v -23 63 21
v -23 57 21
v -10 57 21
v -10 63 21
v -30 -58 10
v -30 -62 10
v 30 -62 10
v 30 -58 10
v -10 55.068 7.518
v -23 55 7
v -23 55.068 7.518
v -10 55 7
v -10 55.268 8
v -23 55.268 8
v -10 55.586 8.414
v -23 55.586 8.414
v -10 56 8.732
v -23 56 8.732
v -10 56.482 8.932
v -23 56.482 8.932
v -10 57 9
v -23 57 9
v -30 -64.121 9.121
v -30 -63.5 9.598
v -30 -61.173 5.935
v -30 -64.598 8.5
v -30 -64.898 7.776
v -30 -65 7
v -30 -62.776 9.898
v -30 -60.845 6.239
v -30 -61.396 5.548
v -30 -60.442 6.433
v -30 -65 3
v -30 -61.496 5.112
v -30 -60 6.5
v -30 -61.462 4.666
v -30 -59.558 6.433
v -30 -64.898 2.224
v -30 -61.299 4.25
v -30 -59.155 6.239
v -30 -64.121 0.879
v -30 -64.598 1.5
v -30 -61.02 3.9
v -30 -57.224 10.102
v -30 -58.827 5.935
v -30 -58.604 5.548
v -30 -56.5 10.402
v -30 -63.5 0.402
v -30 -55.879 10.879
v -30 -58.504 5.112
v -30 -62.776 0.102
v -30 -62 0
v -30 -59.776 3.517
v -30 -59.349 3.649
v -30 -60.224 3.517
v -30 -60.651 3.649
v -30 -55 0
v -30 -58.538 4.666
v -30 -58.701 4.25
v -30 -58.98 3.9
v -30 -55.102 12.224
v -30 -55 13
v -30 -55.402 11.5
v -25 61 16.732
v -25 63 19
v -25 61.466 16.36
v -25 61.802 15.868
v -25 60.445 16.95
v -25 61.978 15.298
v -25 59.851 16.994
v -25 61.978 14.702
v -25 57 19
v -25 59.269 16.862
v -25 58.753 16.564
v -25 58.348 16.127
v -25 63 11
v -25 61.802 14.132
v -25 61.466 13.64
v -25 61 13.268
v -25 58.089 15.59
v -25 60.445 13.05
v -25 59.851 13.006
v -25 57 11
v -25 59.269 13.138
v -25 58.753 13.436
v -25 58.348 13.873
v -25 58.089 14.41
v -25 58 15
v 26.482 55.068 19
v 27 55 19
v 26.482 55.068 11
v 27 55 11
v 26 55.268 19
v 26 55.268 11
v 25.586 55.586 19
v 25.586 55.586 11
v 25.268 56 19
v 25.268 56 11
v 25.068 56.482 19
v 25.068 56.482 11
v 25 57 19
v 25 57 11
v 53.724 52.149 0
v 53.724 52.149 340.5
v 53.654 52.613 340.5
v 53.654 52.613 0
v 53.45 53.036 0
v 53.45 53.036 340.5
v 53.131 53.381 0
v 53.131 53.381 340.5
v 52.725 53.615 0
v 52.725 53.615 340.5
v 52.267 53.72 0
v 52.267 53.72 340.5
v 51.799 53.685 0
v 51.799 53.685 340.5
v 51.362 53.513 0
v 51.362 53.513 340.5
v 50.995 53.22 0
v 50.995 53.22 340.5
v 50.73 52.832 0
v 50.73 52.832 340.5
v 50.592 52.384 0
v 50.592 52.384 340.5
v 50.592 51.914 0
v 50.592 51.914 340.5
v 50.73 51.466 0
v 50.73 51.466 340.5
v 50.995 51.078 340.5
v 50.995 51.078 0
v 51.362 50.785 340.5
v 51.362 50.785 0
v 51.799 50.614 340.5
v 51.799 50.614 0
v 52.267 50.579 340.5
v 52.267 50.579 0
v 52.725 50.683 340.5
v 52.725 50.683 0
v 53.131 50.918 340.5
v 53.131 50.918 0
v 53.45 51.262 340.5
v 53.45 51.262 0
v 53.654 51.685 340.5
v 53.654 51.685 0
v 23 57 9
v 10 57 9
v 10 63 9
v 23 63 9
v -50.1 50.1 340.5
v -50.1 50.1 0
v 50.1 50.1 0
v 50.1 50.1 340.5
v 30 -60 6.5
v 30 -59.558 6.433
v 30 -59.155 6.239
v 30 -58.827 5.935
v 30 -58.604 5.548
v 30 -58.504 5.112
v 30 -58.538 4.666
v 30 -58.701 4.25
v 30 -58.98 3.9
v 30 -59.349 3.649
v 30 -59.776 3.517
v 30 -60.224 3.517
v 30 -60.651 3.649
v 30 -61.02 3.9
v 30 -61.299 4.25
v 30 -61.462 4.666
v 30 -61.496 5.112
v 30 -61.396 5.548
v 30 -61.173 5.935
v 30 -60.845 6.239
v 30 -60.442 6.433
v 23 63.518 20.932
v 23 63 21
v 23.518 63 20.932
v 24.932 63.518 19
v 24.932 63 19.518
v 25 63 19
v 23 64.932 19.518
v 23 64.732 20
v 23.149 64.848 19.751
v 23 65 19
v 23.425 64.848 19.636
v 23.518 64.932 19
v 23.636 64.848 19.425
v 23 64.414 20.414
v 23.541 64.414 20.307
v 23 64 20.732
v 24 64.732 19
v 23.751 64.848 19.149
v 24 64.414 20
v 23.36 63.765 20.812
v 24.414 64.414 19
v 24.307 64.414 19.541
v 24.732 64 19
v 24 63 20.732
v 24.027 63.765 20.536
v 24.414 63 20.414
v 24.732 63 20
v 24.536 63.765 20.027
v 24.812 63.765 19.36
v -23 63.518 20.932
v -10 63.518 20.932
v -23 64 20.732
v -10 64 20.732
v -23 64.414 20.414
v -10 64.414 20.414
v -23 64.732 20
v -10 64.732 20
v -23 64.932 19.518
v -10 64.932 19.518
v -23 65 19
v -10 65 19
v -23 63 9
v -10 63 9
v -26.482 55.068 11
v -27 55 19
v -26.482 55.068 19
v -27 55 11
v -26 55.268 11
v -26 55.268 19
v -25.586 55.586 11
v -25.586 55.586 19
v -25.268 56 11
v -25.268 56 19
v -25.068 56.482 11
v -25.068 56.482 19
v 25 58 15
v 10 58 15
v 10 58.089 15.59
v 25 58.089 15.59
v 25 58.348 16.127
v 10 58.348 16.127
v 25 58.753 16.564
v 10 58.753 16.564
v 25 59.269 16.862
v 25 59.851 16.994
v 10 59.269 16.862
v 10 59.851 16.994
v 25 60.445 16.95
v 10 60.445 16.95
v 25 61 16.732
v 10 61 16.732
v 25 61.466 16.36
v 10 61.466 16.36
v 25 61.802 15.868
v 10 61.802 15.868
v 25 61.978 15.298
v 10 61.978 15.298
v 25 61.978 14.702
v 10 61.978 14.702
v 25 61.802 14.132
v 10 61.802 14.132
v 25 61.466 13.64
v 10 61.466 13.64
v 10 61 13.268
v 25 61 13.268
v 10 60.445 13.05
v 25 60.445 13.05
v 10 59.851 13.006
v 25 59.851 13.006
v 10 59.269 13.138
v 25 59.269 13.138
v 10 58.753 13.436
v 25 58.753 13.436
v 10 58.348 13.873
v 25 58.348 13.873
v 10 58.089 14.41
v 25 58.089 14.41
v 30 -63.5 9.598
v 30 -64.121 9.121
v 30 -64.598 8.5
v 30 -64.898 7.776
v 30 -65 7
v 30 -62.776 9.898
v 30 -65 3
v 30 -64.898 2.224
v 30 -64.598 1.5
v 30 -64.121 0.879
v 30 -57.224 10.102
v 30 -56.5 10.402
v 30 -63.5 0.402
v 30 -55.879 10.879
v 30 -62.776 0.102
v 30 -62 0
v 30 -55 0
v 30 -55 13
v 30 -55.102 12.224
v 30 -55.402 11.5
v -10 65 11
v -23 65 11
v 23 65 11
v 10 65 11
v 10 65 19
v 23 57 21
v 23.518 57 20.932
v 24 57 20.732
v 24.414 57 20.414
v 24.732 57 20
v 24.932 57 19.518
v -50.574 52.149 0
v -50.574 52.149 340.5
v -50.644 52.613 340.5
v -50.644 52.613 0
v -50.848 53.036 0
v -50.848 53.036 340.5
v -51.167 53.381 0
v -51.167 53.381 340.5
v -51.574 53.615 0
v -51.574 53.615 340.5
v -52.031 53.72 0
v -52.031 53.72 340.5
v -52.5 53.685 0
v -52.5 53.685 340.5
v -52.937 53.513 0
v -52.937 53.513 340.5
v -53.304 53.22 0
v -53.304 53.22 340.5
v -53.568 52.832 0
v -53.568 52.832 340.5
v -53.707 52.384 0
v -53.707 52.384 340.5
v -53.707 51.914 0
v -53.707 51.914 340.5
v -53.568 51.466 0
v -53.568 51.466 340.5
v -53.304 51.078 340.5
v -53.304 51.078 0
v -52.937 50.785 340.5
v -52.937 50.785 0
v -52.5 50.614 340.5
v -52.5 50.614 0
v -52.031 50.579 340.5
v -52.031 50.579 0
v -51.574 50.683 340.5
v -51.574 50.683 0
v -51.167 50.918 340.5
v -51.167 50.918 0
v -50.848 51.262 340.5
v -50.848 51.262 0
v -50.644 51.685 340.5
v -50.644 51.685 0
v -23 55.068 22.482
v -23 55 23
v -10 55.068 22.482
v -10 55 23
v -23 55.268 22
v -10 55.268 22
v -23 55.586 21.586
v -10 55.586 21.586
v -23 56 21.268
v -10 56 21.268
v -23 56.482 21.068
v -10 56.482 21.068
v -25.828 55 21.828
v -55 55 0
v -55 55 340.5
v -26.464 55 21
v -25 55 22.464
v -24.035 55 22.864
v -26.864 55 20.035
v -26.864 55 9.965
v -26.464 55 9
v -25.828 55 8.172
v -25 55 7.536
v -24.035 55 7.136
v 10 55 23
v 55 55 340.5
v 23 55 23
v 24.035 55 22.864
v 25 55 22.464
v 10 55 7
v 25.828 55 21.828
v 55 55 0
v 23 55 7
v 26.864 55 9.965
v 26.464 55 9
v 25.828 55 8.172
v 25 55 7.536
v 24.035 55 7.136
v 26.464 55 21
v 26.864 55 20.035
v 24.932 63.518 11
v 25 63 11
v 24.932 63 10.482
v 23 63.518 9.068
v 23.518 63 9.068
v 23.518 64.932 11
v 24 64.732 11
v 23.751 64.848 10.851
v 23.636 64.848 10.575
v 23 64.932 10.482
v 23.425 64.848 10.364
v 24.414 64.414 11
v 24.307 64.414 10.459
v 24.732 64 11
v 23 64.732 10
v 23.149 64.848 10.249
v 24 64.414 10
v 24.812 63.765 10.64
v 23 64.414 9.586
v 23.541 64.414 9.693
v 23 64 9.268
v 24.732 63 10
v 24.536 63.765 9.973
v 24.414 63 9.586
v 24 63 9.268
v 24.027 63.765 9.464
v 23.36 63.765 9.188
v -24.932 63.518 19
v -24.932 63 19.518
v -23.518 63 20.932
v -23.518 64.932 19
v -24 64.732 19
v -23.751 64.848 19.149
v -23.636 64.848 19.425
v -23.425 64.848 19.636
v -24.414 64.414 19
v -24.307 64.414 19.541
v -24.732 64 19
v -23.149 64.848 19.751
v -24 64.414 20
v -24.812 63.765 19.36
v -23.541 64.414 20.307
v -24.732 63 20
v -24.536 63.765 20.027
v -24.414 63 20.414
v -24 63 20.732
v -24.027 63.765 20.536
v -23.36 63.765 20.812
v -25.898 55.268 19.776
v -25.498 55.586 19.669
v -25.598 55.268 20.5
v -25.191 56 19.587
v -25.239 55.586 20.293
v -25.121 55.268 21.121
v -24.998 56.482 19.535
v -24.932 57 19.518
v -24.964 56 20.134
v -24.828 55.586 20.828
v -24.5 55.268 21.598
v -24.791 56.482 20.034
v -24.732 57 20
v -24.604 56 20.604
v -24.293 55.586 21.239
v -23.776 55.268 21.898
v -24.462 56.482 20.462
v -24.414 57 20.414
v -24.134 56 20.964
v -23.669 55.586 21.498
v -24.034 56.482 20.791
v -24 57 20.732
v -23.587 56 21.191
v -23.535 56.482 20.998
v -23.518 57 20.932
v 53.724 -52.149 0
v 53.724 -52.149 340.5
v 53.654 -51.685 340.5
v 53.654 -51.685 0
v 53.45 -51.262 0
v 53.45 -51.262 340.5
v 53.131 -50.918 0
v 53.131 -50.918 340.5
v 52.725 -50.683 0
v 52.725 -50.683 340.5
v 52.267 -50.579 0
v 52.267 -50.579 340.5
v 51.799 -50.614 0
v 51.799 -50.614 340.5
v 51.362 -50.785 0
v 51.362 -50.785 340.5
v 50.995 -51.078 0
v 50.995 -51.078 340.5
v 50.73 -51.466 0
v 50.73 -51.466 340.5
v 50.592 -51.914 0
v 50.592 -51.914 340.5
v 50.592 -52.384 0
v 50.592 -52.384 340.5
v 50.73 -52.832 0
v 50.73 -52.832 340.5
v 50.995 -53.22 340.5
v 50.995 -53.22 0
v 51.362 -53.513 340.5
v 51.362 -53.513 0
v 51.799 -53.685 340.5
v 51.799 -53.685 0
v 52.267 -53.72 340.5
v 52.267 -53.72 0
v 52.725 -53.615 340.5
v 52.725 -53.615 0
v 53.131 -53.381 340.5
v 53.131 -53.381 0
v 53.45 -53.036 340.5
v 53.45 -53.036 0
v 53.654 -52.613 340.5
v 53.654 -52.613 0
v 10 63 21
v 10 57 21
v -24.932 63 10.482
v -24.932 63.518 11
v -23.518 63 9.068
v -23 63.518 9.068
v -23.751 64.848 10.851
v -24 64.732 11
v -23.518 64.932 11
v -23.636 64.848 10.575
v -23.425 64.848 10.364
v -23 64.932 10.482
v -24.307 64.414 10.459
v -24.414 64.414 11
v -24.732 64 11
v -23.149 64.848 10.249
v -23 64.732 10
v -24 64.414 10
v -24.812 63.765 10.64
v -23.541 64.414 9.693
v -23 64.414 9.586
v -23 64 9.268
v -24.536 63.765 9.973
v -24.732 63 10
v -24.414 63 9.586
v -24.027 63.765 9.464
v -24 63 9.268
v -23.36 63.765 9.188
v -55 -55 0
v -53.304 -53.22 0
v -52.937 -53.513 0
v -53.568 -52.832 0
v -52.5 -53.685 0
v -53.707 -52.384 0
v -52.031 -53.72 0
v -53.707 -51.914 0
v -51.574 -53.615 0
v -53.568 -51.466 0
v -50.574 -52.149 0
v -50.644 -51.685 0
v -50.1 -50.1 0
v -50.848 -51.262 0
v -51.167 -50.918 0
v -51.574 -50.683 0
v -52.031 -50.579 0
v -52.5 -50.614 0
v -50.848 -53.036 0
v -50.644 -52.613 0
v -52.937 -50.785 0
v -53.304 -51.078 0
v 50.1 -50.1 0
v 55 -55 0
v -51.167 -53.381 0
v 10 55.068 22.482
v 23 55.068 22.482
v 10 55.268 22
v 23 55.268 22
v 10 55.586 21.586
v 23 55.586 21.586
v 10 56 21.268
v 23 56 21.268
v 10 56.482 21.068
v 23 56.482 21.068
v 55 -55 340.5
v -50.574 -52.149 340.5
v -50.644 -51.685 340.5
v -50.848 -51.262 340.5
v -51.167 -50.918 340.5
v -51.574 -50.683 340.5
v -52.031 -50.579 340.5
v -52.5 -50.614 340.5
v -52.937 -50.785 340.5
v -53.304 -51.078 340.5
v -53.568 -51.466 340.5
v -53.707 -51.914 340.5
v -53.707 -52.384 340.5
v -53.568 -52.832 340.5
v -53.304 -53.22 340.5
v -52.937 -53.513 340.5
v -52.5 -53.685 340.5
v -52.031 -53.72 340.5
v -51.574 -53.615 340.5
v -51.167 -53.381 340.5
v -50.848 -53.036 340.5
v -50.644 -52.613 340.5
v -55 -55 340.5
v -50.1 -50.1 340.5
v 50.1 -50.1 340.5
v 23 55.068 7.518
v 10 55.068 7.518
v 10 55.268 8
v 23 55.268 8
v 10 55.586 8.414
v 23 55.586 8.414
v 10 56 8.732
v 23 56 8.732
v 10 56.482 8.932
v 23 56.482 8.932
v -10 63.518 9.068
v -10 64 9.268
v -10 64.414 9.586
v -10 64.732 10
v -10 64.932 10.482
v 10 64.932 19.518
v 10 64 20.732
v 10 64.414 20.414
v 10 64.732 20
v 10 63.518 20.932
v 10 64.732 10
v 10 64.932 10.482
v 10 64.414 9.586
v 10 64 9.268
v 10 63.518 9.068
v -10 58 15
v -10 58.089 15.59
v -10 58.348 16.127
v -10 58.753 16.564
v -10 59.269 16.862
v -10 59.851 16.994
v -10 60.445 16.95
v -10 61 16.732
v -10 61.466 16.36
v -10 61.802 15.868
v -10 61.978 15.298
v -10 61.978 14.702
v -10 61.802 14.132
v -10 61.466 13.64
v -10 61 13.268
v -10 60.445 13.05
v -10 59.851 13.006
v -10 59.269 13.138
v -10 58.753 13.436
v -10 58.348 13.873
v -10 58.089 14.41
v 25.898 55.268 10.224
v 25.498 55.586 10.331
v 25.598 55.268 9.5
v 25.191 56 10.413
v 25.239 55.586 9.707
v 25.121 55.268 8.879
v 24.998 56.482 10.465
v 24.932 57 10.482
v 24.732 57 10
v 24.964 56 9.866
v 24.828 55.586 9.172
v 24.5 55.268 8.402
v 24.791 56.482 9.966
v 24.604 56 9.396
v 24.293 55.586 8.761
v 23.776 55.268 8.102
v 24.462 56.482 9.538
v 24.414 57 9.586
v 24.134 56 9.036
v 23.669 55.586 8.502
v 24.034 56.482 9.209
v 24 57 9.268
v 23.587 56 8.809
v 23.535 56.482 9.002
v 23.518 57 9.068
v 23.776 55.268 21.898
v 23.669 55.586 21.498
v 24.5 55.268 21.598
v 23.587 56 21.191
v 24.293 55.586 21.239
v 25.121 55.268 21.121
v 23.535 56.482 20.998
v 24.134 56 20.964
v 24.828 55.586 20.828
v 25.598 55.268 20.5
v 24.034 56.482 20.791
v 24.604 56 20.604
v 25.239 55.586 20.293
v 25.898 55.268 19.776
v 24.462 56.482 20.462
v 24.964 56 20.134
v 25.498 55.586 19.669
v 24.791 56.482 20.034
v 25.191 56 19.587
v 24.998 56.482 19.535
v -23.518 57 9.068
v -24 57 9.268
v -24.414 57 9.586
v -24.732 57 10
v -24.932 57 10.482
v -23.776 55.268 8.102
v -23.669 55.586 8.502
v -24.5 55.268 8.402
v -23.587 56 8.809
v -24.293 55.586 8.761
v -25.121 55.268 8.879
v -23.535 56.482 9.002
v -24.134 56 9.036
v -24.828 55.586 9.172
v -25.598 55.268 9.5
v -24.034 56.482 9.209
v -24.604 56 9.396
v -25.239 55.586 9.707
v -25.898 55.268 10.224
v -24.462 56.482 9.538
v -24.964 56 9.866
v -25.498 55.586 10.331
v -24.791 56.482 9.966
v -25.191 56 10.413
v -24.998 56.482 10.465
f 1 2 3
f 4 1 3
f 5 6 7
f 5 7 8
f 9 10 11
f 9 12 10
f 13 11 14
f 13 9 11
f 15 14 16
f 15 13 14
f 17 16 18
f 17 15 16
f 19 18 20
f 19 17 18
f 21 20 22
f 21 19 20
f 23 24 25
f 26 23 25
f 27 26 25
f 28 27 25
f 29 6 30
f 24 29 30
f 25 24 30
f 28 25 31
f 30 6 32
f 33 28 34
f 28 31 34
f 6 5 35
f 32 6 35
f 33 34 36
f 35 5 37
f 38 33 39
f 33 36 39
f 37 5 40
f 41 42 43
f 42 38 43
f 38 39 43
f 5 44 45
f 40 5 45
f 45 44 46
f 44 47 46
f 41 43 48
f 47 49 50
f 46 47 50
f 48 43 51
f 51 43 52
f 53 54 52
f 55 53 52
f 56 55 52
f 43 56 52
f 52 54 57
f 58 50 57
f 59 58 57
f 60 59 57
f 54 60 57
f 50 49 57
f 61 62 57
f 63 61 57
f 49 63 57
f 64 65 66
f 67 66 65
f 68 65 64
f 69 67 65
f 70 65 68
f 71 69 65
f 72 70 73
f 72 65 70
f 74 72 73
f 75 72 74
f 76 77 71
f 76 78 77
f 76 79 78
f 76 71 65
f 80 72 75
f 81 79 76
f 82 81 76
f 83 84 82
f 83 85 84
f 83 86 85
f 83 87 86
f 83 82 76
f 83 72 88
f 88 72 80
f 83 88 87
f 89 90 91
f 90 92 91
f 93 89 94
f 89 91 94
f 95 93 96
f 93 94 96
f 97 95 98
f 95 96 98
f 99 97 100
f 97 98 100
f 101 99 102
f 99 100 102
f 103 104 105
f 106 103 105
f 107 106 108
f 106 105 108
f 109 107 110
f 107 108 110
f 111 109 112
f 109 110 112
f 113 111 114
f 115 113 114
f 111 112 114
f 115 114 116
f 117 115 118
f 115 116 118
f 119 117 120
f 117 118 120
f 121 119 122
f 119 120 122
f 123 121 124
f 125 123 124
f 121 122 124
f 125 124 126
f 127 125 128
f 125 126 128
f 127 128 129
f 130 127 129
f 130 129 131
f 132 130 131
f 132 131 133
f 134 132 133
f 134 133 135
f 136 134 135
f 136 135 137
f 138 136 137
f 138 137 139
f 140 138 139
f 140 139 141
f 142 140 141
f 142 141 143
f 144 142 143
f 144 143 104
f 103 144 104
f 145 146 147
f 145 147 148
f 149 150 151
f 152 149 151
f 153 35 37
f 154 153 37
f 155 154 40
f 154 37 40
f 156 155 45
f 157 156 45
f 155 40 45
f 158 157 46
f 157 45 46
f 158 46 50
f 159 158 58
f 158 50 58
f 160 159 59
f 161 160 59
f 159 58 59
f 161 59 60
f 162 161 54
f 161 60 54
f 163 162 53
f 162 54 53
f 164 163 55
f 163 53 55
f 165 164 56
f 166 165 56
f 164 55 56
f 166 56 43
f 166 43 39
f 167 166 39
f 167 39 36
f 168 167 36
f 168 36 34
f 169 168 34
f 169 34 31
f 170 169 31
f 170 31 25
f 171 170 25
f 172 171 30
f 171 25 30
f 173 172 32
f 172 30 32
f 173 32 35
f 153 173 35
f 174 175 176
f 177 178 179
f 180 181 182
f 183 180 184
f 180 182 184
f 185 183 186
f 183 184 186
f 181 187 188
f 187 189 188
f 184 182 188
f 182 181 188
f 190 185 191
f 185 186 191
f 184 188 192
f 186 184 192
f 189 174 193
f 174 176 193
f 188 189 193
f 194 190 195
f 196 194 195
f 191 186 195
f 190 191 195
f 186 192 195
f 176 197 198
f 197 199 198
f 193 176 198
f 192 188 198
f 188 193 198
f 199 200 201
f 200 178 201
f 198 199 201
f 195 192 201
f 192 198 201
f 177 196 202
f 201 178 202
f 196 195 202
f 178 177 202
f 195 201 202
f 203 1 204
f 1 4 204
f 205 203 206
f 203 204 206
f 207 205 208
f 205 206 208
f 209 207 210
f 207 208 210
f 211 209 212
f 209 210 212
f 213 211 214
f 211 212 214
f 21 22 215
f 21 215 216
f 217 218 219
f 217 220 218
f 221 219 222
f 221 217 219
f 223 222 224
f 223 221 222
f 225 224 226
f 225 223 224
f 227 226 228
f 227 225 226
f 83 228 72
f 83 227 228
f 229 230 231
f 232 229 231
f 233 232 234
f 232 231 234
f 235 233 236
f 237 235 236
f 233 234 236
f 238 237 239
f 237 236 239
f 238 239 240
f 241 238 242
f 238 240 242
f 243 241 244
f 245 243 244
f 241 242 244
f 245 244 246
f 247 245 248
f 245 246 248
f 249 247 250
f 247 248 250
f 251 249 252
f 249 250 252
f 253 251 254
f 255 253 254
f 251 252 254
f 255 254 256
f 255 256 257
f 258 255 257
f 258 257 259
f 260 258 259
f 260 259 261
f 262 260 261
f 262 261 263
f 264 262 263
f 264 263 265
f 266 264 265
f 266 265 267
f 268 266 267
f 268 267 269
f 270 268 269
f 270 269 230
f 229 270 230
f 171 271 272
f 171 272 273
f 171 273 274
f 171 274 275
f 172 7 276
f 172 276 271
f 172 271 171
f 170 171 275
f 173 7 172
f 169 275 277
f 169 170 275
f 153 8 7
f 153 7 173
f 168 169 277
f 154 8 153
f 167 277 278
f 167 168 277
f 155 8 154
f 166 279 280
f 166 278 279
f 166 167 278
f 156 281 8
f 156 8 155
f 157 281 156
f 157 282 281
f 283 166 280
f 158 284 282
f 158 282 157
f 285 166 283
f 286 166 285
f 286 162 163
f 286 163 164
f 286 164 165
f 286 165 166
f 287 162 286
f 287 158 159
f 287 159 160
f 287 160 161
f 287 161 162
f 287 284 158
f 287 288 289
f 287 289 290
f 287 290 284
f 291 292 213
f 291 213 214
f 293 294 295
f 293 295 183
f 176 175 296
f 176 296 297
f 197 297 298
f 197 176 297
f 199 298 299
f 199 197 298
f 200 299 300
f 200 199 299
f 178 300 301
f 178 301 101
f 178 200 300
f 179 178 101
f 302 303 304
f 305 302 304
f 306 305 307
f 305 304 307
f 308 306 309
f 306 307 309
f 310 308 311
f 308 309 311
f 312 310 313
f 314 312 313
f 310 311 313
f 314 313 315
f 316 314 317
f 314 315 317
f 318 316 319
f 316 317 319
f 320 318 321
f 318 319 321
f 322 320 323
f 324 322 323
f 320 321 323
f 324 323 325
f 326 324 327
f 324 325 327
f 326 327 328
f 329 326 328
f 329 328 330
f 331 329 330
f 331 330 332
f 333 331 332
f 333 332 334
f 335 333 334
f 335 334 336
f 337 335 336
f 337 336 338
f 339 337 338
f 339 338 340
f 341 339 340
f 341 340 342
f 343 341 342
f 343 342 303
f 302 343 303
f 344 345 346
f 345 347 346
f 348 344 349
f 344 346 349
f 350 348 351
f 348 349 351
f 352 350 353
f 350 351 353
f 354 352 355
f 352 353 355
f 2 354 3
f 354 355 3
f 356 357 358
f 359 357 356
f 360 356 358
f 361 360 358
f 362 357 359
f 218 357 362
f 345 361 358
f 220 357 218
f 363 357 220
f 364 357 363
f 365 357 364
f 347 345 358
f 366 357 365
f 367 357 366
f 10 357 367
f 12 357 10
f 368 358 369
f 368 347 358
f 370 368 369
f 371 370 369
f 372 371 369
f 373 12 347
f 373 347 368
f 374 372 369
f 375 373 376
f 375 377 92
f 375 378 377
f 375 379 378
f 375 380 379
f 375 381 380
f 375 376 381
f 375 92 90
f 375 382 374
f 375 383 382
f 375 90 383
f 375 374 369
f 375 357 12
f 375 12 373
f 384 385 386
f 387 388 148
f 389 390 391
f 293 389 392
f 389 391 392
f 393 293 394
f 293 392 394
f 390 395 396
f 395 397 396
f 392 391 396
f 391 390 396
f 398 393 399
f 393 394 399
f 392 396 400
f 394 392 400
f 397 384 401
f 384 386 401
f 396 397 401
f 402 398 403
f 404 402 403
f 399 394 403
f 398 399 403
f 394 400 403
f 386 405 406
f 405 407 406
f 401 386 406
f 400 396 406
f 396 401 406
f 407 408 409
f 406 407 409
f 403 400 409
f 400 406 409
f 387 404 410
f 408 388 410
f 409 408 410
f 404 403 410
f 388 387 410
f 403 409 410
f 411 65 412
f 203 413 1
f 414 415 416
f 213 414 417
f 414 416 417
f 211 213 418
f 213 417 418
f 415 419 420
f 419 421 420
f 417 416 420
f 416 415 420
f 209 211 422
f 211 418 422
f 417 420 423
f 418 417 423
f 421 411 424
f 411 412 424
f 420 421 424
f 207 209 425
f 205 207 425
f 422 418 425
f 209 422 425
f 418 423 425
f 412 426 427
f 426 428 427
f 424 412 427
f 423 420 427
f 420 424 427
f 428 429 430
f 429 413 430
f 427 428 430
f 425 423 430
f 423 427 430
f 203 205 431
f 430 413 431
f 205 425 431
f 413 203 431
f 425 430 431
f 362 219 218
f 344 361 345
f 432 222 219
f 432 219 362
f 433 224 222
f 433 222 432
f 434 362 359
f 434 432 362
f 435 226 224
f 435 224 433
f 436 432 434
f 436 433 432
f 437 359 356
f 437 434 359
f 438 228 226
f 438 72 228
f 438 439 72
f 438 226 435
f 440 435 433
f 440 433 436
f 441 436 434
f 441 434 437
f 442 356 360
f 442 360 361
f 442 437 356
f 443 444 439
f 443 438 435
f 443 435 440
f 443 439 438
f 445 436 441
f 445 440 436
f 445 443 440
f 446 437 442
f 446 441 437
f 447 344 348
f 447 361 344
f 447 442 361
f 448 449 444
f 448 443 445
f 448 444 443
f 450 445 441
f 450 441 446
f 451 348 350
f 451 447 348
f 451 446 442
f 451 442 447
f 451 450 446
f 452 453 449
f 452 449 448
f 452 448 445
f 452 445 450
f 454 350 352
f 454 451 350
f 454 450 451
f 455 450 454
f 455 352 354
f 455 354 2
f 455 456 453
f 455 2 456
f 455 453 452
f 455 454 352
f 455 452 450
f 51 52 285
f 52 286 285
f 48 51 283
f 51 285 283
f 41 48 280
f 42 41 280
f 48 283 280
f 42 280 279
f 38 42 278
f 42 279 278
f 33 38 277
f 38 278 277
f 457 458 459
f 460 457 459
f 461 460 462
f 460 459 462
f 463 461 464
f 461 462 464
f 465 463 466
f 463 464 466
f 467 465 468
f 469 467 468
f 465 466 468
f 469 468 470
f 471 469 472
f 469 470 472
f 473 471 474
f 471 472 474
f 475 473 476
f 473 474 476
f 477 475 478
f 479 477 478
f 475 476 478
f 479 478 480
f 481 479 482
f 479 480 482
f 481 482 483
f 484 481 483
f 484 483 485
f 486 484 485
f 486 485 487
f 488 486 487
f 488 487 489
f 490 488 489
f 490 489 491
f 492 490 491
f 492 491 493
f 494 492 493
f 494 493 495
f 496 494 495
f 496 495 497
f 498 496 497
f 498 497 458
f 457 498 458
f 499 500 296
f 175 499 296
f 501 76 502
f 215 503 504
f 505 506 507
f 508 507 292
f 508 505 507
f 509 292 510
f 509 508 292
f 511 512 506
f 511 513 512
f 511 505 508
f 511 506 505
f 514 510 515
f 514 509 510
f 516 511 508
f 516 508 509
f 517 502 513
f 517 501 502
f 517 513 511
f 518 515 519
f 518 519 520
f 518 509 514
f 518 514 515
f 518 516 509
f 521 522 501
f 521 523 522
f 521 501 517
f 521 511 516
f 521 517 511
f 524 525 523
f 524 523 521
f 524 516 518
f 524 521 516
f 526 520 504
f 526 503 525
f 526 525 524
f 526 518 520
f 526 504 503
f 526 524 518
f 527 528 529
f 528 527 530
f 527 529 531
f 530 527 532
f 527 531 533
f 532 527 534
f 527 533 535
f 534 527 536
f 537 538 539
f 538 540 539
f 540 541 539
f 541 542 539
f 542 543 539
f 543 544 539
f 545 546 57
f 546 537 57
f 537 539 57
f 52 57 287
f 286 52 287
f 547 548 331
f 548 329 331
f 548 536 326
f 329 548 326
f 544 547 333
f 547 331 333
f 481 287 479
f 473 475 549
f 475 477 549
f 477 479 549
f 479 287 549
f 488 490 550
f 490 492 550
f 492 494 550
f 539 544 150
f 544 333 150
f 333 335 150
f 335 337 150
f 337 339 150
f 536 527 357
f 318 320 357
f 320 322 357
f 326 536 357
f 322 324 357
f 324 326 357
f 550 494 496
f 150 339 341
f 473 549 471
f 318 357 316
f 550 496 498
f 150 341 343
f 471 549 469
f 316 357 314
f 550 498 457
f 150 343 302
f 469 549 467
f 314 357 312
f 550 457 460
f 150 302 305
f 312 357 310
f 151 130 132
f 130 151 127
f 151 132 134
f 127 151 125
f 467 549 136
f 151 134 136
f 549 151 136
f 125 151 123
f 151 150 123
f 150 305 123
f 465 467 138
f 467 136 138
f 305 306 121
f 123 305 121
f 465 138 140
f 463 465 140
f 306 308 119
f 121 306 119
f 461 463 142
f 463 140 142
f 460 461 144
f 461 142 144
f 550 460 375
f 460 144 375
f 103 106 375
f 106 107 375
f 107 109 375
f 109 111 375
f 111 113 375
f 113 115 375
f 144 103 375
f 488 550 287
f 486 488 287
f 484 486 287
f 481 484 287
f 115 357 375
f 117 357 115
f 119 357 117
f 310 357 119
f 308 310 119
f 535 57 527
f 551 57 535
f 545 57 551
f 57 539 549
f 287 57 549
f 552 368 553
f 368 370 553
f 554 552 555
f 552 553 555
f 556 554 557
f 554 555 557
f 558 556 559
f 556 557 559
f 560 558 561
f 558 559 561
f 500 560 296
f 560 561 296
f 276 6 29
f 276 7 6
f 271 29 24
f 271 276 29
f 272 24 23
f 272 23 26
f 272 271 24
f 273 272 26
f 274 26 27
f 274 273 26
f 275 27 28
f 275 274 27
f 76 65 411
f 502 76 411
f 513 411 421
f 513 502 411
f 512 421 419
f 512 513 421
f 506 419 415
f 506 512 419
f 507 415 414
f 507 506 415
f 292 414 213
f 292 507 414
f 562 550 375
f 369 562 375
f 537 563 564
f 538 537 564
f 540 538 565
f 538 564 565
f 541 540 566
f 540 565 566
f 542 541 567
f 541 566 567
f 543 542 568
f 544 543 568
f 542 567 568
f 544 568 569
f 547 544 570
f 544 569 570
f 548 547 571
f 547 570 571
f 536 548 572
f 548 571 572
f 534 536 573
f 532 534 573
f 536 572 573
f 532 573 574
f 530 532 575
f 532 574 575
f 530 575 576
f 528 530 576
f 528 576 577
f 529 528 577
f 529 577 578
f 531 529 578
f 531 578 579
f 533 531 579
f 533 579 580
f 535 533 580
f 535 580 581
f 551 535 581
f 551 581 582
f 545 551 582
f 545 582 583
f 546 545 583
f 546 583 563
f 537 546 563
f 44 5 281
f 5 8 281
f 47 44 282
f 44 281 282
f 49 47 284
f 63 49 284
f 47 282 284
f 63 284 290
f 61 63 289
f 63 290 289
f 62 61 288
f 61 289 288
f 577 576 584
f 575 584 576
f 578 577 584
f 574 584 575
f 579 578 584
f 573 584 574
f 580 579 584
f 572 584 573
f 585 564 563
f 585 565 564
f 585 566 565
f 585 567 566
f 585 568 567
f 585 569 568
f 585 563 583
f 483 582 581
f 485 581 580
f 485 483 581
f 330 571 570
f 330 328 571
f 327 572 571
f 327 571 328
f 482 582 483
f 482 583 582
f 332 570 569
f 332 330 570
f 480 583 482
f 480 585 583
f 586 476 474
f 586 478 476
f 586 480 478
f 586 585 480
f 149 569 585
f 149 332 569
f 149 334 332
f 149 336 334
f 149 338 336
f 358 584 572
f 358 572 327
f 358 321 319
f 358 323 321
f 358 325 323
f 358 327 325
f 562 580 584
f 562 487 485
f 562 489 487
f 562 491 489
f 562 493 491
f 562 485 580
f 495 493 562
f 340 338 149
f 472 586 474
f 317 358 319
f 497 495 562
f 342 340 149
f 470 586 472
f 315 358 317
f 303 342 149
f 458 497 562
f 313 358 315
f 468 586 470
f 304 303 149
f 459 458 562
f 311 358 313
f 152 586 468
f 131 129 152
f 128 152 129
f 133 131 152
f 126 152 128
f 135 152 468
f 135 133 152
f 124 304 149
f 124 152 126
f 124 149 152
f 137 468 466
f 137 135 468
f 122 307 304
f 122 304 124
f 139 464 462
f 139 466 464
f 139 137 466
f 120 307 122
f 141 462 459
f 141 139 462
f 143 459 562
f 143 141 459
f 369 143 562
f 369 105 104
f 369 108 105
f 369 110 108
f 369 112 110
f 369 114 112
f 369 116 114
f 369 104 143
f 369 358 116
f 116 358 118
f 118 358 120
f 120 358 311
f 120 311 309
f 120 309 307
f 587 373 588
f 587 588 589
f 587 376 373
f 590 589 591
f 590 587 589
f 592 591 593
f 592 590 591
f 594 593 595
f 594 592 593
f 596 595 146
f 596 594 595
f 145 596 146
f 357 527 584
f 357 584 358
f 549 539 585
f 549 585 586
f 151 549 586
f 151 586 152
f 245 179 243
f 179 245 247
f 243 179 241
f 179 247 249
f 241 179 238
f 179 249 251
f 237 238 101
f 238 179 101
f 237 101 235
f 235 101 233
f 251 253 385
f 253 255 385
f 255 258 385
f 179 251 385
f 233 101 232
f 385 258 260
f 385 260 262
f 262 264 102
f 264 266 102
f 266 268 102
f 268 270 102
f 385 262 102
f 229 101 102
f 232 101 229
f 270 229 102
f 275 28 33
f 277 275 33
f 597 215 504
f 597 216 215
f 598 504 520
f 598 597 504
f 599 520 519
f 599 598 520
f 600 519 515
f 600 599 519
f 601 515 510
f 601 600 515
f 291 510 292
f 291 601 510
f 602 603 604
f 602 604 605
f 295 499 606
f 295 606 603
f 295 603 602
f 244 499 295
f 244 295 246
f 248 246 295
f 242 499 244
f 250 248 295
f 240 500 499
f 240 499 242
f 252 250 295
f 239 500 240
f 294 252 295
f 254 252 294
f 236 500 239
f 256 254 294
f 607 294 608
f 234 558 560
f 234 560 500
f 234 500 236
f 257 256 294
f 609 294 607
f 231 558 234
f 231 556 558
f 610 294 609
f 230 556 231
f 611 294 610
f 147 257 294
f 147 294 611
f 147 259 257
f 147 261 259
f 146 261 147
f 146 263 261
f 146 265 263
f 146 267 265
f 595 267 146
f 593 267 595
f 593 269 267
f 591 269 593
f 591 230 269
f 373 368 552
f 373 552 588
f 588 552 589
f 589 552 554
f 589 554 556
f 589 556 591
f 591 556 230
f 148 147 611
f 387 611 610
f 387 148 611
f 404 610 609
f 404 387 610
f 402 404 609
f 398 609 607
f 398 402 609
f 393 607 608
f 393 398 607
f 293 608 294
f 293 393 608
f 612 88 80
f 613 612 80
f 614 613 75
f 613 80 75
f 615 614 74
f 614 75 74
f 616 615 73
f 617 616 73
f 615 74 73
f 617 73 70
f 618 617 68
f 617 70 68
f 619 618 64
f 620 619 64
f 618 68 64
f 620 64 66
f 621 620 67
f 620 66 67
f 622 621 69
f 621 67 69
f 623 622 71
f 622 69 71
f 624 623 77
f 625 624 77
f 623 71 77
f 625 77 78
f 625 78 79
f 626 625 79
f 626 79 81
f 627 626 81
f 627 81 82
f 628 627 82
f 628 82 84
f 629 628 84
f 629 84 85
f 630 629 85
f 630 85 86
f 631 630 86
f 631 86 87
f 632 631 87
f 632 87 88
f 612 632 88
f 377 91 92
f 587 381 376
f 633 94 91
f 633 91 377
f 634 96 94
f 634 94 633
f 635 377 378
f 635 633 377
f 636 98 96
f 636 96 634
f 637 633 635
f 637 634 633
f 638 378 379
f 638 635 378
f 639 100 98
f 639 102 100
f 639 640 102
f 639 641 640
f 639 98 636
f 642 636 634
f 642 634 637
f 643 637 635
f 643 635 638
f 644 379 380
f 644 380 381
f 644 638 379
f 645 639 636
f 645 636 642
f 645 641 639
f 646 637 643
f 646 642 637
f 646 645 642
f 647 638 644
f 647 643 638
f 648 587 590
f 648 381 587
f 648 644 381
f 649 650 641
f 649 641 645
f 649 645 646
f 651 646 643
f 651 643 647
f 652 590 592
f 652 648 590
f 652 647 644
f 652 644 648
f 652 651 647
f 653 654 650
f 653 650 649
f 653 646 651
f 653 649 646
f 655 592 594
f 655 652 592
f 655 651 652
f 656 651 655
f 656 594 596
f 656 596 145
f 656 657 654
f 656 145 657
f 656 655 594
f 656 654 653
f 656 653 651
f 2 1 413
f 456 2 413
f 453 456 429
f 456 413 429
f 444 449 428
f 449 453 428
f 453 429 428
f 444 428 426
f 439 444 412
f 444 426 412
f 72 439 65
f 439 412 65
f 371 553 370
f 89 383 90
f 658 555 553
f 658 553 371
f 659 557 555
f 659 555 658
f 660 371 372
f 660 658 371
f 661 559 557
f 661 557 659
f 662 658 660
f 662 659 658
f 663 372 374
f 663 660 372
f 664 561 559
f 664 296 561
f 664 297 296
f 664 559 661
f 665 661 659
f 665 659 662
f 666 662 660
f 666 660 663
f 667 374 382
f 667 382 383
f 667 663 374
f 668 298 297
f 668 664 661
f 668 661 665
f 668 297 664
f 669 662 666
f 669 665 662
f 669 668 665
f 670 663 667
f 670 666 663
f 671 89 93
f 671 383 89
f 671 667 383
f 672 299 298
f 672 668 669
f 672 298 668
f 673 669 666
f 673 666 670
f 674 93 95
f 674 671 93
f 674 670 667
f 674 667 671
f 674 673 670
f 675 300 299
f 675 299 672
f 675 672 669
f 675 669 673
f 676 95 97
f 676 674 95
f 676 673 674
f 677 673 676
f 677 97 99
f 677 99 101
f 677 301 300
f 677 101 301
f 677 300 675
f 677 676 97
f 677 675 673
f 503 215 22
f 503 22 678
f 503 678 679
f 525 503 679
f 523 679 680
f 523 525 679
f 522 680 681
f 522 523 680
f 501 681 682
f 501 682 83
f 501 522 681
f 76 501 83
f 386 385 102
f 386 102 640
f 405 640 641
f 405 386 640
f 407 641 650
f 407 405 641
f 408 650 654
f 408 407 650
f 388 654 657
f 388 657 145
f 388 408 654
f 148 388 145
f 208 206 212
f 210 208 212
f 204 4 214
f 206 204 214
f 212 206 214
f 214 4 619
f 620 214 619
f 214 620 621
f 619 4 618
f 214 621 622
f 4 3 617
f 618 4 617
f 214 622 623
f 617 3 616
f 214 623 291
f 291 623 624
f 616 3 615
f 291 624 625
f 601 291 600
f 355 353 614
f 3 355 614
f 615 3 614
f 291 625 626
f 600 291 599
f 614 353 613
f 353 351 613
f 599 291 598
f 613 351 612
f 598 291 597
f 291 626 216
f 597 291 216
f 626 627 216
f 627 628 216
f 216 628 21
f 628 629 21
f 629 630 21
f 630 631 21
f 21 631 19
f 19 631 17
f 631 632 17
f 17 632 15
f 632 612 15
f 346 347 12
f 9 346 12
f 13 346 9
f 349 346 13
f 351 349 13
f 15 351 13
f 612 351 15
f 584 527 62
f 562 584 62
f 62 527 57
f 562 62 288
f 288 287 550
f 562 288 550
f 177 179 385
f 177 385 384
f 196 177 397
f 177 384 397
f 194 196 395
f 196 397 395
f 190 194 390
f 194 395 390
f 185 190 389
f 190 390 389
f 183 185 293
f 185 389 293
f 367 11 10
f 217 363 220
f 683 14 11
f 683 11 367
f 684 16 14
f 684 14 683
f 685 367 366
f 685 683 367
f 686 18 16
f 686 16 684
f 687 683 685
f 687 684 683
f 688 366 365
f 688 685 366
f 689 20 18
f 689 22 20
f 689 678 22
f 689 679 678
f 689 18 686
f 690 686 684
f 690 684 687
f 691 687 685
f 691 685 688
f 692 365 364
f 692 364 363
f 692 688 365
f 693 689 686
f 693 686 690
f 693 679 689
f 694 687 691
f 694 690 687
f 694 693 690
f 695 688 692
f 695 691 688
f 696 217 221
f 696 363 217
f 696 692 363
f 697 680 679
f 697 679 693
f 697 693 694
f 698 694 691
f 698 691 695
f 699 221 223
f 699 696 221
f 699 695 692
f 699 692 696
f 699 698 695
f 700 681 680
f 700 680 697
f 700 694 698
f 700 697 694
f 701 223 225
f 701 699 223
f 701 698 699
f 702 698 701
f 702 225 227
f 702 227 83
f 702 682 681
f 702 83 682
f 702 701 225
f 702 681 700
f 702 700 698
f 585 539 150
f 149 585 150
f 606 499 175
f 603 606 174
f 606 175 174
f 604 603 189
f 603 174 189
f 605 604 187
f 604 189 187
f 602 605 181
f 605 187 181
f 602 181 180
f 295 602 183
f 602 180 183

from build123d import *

# Parameters (mm, degrees)
SKETCH1_W                = 110
SKETCH1_H                = 110
SKETCH1_W_2              = 100.2
SKETCH1_H_2              = 100.2
BOSS_EXTRUDE1_DEPTH      = 340.5
CUT_EXTRUDE1_REACH       = 351.271
SKETCH2_R                = 1.575
BOSS_EXTRUDE3_DEPTH      = 30
BOSS_EXTRUDE3_DEPTH_BACK = 30
SKETCH3_W                = 10
SKETCH3_H                = 10
SKETCH4_R                = 1.5
CUT_EXTRUDE2_DEPTH       = 60
SKETCH6_W                = 15
SKETCH6_H                = 12
BOSS_EXTRUDE4_DEPTH      = 10
CUT_EXTRUDE3_REACH       = 357.76
SKETCH7_R                = 2
FILLET1_R                = 2
FILLET2_R                = 3


with BuildPart() as part:
    # Sketch1 → Boss-Extrude1 (new body)
    with BuildSketch(Plane.XY):
        Rectangle(SKETCH1_W, SKETCH1_H)
        Rectangle(SKETCH1_W_2, SKETCH1_H_2, mode=Mode.SUBTRACT)
    extrude(amount=BOSS_EXTRUDE1_DEPTH)

    # Sketch2 → Cut-Extrude1 (cut, up to next)
    with BuildSketch(Plane.XY.offset(340.5), mode=Mode.PRIVATE) as cut_extrude1_sk1:
        with Locations((-52.149125113, 52.149125113)):
            Circle(SKETCH2_R)
    cut_extrude1_tool1 = extrude(cut_extrude1_sk1.sketch, amount=-CUT_EXTRUDE1_REACH, mode=Mode.PRIVATE) & part.part
    # Sketch2 → Cut-Extrude1 (cut, up to next)
    with BuildSketch(Plane.XY.offset(340.5), mode=Mode.PRIVATE) as cut_extrude1_sk2:
        with Locations((52.149125113, 52.149125113)):
            Circle(SKETCH2_R)
    cut_extrude1_tool2 = extrude(cut_extrude1_sk2.sketch, amount=-CUT_EXTRUDE1_REACH, mode=Mode.PRIVATE) & part.part
    # Sketch2 → Cut-Extrude1 (cut, up to next)
    with BuildSketch(Plane.XY.offset(340.5), mode=Mode.PRIVATE) as cut_extrude1_sk3:
        with Locations((52.149125113, -52.149125113)):
            Circle(SKETCH2_R)
    cut_extrude1_tool3 = extrude(cut_extrude1_sk3.sketch, amount=-CUT_EXTRUDE1_REACH, mode=Mode.PRIVATE) & part.part
    # Sketch2 → Cut-Extrude1 (cut, up to next)
    with BuildSketch(Plane.XY.offset(340.5), mode=Mode.PRIVATE) as cut_extrude1_sk4:
        with Locations((-52.149125113, -52.149125113)):
            Circle(SKETCH2_R)
    cut_extrude1_tool4 = extrude(cut_extrude1_sk4.sketch, amount=-CUT_EXTRUDE1_REACH, mode=Mode.PRIVATE) & part.part
    add(cut_extrude1_tool1.solids().sort_by_distance((-52.149125, 52.149125, 340.5))[0], mode=Mode.SUBTRACT)
    add(cut_extrude1_tool2.solids().sort_by_distance((52.149125, 52.149125, 340.5))[0], mode=Mode.SUBTRACT)
    add(cut_extrude1_tool3.solids().sort_by_distance((52.149125, -52.149125, 340.5))[0], mode=Mode.SUBTRACT)
    add(cut_extrude1_tool4.solids().sort_by_distance((-52.149125, -52.149125, 340.5))[0], mode=Mode.SUBTRACT)

    # Sketch3 → Boss-Extrude3 (add, two sides: drawn at the far end of the back side and taken through both)
    with BuildSketch(Plane(origin=(0, 0, 0), x_dir=(0, 0, -1), z_dir=(1, 0, 0)).offset(-BOSS_EXTRUDE3_DEPTH_BACK)):
        with Locations((-5, -60)):
            Rectangle(SKETCH3_W, SKETCH3_H)
    extrude(amount=BOSS_EXTRUDE3_DEPTH + BOSS_EXTRUDE3_DEPTH_BACK)

    # Sketch4 → Cut-Extrude2 (cut)
    with BuildSketch(Plane.ZY.offset(30)):
        with Locations((5, -60)):
            Circle(SKETCH4_R)
    extrude(amount=-CUT_EXTRUDE2_DEPTH, mode=Mode.SUBTRACT)

    # Sketch6 → Boss-Extrude4 (add)
    with BuildSketch(Plane(origin=(0, 55, 0), x_dir=(1, 0, 0), z_dir=(0, 1, 0))):
        with Locations((-17.5, -15)):
            Rectangle(SKETCH6_W, SKETCH6_H)
        with Locations((17.5, -15)):
            Rectangle(SKETCH6_W, SKETCH6_H)
    extrude(amount=BOSS_EXTRUDE4_DEPTH)

    # Cut-Extrude3: up to this face of the body (flat: up to its plane)
    cut_extrude3_end = Plane(part.part.faces().sort_by_distance((25, 60, 15))[0])
    # Sketch7 → Cut-Extrude3 (cut, up to the picked face)
    with BuildSketch(Plane.ZY.offset(25), mode=Mode.PRIVATE) as cut_extrude3_sk1:
        with Locations(Location((15, 60, 0), (0, 0, 270))):
            Circle(SKETCH7_R)
    cut_extrude3_tool1 = split(extrude(cut_extrude3_sk1.sketch, amount=-CUT_EXTRUDE3_REACH, mode=Mode.PRIVATE), bisect_by=cut_extrude3_end, keep=Keep.BOTH, mode=Mode.PRIVATE)
    add(cut_extrude3_tool1.solids().sort_by(Axis((-25, 60, 15), (1, 0, 0)))[0], mode=Mode.SUBTRACT)

    # Fillet1
    fillet1_edges = [part.edges().sort_by_distance(p)[0] for p in [
        (-25, 55, 15),
        (-25, 60, 9),
        (-17.5, 55, 21),
        (-25, 60, 21),
        (-17.5, 55, 9),
        (-25, 65, 15),
        (-17.5, 65, 21),
        (-17.5, 65, 9),
        (17.5, 55, 21),
        (25, 55, 15),
        (25, 60, 21),
        (17.5, 55, 9),
        (25, 60, 9),
        (17.5, 65, 21),
        (25, 65, 15),
        (17.5, 65, 9),
    ]]
    fillet(fillet1_edges, radius=FILLET1_R)

    # Fillet2
    fillet2_edges = [part.edges().sort_by_distance(p)[0] for p in [
        (0, -65, 0),
        (0, -65, 10),
        (0, -55, 10),
    ]]
    fillet(fillet2_edges, radius=FILLET2_R)


solid = part.part
